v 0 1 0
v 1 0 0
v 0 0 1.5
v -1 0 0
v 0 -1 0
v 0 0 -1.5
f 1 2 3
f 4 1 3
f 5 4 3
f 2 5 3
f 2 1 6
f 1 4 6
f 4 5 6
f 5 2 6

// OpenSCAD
// Diamond Model
module diamond() {
    color("white", 0.9) // Add a slight transparency for visualization
        union() {
            // Top half of the diamond
            scale([1, 1, 1.5]) // Stretch vertically for a diamond proportion
                polyhedron(
                    points=[
                        [0, 0, 1],     // Topmost tip
                        [1, 0, 0],     // Points at the base
                        [-1, 0, 0],
                        [0, 1, 0],
                        [0, -1, 0],
                        [0, 0, -1]     // Bottommost tip
                    ],
                    faces=[
                        [0, 1, 3], // Top pyramid faces
                        [0, 3, 2],
                        [0, 2, 4],
                        [0, 4, 1],

                        [5, 3, 1], // Bottom pyramid faces
                        [5, 2, 3],
                        [5, 4, 2],
                        [5, 1, 4]
                    ]
                );
        }
}

// Call the diamond module
diamond();
